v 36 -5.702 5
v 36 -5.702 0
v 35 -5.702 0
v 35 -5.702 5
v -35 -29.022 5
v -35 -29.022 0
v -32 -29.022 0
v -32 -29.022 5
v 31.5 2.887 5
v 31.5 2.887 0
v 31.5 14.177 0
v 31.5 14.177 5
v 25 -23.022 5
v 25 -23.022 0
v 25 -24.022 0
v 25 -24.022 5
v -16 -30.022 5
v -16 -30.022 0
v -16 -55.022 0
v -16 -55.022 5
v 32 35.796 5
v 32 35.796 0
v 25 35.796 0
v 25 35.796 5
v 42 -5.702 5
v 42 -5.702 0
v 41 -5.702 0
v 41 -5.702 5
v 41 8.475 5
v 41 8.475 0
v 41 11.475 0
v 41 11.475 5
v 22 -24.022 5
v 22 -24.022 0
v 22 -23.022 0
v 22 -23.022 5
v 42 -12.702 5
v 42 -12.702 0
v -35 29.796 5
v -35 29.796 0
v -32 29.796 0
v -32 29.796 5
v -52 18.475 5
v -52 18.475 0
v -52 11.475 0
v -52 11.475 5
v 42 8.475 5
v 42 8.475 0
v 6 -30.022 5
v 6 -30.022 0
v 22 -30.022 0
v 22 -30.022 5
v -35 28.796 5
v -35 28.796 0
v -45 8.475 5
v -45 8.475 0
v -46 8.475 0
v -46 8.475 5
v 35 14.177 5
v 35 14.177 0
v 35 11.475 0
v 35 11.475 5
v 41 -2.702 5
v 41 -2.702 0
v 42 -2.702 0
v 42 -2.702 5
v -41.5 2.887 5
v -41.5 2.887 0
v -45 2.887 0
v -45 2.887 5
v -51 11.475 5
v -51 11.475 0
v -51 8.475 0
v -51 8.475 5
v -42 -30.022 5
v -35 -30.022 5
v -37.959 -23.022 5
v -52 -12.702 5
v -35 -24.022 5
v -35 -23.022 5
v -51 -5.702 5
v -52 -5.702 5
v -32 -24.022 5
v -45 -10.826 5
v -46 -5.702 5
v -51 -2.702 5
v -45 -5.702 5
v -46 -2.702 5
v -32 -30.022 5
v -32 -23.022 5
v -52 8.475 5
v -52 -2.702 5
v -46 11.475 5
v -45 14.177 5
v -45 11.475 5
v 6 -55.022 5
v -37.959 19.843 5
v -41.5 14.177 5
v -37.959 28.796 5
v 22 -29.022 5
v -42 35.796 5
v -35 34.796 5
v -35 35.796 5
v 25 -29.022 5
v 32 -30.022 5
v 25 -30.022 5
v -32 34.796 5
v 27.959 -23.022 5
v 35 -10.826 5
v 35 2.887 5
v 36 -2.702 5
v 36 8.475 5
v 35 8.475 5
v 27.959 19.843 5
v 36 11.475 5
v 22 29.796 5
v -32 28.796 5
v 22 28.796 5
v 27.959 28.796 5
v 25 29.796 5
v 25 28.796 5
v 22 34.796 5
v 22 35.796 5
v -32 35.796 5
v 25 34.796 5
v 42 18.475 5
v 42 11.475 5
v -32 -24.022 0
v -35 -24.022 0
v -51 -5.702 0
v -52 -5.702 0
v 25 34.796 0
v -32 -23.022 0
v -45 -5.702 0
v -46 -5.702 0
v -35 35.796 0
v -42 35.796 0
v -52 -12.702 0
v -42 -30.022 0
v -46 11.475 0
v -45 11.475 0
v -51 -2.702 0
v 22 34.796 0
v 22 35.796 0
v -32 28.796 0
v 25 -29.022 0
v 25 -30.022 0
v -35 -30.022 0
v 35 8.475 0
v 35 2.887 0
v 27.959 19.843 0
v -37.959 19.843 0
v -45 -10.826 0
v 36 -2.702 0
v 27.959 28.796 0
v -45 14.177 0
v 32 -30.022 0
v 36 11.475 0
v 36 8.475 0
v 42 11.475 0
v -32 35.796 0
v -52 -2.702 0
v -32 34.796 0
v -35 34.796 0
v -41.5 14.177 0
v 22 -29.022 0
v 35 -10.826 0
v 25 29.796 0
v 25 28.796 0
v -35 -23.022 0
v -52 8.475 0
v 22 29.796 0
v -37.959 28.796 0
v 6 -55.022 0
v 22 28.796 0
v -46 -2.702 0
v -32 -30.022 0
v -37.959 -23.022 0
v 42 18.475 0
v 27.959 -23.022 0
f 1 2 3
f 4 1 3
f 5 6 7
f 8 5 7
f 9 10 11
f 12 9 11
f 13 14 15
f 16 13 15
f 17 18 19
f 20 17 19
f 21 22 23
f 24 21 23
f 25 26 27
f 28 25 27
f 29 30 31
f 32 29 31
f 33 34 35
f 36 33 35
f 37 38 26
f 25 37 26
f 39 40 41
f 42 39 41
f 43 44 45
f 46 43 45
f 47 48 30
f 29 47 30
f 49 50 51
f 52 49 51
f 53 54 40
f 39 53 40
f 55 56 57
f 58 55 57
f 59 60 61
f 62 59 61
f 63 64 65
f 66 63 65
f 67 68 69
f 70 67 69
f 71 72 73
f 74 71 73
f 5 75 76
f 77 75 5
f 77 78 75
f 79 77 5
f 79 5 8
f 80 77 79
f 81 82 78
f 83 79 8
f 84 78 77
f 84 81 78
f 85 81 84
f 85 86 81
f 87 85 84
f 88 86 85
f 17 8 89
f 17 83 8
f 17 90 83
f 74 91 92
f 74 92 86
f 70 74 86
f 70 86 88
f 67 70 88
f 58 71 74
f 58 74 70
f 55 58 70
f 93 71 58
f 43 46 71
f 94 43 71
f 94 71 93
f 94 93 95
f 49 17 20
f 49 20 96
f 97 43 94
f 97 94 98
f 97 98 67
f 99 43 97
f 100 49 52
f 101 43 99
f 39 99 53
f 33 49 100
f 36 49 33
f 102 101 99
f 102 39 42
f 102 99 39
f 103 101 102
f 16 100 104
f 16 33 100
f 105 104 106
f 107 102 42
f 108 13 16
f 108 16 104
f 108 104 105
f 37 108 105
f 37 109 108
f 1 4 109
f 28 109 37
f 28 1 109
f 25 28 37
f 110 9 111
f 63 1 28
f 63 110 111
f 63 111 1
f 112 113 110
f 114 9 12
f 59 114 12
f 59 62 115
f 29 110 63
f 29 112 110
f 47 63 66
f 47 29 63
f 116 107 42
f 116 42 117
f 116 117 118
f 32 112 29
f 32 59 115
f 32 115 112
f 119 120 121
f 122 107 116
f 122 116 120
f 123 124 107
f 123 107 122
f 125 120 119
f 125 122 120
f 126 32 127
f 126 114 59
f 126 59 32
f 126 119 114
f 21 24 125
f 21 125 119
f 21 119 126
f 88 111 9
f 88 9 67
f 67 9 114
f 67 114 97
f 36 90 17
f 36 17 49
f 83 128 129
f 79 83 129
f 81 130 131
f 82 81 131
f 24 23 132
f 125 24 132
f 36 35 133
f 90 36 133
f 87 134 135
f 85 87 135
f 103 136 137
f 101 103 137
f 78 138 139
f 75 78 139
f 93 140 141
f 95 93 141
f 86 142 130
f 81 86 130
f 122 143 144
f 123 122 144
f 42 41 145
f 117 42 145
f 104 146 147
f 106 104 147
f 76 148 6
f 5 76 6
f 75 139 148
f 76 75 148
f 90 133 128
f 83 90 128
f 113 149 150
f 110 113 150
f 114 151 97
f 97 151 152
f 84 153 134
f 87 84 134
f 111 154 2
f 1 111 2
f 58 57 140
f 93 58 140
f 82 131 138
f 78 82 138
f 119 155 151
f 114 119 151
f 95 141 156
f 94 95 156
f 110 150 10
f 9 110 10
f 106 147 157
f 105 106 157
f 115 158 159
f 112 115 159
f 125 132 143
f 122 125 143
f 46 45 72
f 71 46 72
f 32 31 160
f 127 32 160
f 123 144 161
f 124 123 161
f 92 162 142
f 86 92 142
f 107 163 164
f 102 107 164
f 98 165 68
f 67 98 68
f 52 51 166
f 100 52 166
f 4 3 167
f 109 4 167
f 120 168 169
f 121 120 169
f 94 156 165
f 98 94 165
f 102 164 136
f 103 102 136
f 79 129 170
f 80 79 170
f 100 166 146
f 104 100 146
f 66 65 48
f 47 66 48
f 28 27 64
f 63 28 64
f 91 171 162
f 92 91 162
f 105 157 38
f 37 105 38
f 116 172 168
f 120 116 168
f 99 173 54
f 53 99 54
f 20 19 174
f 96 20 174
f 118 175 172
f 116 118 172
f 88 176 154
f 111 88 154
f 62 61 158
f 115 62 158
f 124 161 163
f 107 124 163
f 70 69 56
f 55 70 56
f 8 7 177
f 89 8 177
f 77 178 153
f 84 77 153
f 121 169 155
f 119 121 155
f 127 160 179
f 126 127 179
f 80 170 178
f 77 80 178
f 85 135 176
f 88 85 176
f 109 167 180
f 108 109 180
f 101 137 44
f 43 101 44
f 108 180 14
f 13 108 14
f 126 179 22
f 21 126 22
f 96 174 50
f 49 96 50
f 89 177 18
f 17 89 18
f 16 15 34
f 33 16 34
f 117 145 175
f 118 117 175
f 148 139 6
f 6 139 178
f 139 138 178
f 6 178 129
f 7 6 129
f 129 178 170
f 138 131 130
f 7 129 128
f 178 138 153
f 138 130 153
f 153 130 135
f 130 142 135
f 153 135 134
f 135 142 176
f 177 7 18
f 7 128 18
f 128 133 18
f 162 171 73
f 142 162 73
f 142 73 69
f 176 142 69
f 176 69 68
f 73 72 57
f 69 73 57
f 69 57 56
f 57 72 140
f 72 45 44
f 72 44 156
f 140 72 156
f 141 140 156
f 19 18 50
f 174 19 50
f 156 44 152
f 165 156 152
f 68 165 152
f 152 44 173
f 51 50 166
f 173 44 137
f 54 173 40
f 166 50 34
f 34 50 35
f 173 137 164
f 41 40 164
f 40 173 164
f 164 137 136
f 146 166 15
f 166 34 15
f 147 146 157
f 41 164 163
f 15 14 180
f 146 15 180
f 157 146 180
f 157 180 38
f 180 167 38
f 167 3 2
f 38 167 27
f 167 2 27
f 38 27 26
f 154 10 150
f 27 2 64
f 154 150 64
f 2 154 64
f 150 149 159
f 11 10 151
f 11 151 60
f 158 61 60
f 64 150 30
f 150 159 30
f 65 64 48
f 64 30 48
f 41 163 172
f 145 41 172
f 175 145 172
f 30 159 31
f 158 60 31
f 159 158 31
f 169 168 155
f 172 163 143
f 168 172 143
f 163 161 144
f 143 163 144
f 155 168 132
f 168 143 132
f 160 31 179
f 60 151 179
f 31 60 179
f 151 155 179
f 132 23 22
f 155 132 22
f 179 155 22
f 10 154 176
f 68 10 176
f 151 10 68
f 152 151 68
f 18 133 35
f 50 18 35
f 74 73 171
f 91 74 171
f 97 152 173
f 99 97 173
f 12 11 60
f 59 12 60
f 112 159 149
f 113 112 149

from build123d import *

# Parameters (mm, degrees)
BOSS_EXTRU_1_DEPTH = 5


with BuildPart() as part:
    # Esquisse1 → Boss.-Extru.1 (new body)
    with BuildSketch(Plane.XY):
        Polygon((-32, -29.022213998), (-32, -30.022213998), (-16, -30.022213998), (-16, -55.022213998), (6, -55.022213998), (6, -30.022213998), (22, -30.022213998), (22, -29.022213998), (25, -29.022213998), (25, -30.022213998), (32, -30.022213998), (42, -12.701705922), (42, -5.701705922), (41, -5.701705922), (41, -2.701705922), (42, -2.701705922), (42, 8.475208614), (41, 8.475208614), (41, 11.475208614), (42, 11.475208614), (42, 18.475208614), (32, 35.79571669), (25, 35.79571669), (25, 34.79571669), (22, 34.79571669), (22, 35.79571669), (-32, 35.79571669), (-32, 34.79571669), (-35, 34.79571669), (-35, 35.79571669), (-42, 35.79571669), (-52, 18.475208614), (-52, 11.475208614), (-51, 11.475208614), (-51, 8.475208614), (-52, 8.475208614), (-52, -2.701705922), (-51, -2.701705922), (-51, -5.701705922), (-52, -5.701705922), (-52, -12.701705922), (-42, -30.022213998), (-35, -30.022213998), (-35, -29.022213998), align=None)
        Polygon((-46, -2.701705922), (-45, -2.701705922), (35, -2.701705922), (36, -2.701705922), (36, -5.701705922), (35, -5.701705922), (35, -10.826061575), (27.958548116, -23.022213998), (25, -23.022213998), (25, -24.022213998), (22, -24.022213998), (22, -23.022213998), (-32, -23.022213998), (-32, -24.022213998), (-35, -24.022213998), (-35, -23.022213998), (-37.958548116, -23.022213998), (-45, -10.826061575), (-45, -5.701705922), (-46, -5.701705922), align=None, mode=Mode.SUBTRACT)
        Polygon((-45, 2.886751346), (-45, 8.475208614), (-46, 8.475208614), (-46, 11.475208614), (-45, 11.475208614), (-45, 14.177208614), (-41.5, 14.177208614), (-41.5, 2.886751346), align=None, mode=Mode.SUBTRACT)
        Polygon((-32, 29.79571669), (-32, 28.79571669), (22, 28.79571669), (22, 29.79571669), (25, 29.79571669), (25, 28.79571669), (27.958548116, 28.79571669), (27.958548116, 19.842608257), (-37.958548116, 19.842608257), (-37.958548116, 28.79571669), (-35, 28.79571669), (-35, 29.79571669), align=None, mode=Mode.SUBTRACT)
        Polygon((35, 8.475208614), (35, 2.886751346), (31.5, 2.886751346), (31.5, 14.177208614), (35, 14.177208614), (35, 11.475208614), (36, 11.475208614), (36, 8.475208614), align=None, mode=Mode.SUBTRACT)
    extrude(amount=BOSS_EXTRU_1_DEPTH)


solid = part.part
